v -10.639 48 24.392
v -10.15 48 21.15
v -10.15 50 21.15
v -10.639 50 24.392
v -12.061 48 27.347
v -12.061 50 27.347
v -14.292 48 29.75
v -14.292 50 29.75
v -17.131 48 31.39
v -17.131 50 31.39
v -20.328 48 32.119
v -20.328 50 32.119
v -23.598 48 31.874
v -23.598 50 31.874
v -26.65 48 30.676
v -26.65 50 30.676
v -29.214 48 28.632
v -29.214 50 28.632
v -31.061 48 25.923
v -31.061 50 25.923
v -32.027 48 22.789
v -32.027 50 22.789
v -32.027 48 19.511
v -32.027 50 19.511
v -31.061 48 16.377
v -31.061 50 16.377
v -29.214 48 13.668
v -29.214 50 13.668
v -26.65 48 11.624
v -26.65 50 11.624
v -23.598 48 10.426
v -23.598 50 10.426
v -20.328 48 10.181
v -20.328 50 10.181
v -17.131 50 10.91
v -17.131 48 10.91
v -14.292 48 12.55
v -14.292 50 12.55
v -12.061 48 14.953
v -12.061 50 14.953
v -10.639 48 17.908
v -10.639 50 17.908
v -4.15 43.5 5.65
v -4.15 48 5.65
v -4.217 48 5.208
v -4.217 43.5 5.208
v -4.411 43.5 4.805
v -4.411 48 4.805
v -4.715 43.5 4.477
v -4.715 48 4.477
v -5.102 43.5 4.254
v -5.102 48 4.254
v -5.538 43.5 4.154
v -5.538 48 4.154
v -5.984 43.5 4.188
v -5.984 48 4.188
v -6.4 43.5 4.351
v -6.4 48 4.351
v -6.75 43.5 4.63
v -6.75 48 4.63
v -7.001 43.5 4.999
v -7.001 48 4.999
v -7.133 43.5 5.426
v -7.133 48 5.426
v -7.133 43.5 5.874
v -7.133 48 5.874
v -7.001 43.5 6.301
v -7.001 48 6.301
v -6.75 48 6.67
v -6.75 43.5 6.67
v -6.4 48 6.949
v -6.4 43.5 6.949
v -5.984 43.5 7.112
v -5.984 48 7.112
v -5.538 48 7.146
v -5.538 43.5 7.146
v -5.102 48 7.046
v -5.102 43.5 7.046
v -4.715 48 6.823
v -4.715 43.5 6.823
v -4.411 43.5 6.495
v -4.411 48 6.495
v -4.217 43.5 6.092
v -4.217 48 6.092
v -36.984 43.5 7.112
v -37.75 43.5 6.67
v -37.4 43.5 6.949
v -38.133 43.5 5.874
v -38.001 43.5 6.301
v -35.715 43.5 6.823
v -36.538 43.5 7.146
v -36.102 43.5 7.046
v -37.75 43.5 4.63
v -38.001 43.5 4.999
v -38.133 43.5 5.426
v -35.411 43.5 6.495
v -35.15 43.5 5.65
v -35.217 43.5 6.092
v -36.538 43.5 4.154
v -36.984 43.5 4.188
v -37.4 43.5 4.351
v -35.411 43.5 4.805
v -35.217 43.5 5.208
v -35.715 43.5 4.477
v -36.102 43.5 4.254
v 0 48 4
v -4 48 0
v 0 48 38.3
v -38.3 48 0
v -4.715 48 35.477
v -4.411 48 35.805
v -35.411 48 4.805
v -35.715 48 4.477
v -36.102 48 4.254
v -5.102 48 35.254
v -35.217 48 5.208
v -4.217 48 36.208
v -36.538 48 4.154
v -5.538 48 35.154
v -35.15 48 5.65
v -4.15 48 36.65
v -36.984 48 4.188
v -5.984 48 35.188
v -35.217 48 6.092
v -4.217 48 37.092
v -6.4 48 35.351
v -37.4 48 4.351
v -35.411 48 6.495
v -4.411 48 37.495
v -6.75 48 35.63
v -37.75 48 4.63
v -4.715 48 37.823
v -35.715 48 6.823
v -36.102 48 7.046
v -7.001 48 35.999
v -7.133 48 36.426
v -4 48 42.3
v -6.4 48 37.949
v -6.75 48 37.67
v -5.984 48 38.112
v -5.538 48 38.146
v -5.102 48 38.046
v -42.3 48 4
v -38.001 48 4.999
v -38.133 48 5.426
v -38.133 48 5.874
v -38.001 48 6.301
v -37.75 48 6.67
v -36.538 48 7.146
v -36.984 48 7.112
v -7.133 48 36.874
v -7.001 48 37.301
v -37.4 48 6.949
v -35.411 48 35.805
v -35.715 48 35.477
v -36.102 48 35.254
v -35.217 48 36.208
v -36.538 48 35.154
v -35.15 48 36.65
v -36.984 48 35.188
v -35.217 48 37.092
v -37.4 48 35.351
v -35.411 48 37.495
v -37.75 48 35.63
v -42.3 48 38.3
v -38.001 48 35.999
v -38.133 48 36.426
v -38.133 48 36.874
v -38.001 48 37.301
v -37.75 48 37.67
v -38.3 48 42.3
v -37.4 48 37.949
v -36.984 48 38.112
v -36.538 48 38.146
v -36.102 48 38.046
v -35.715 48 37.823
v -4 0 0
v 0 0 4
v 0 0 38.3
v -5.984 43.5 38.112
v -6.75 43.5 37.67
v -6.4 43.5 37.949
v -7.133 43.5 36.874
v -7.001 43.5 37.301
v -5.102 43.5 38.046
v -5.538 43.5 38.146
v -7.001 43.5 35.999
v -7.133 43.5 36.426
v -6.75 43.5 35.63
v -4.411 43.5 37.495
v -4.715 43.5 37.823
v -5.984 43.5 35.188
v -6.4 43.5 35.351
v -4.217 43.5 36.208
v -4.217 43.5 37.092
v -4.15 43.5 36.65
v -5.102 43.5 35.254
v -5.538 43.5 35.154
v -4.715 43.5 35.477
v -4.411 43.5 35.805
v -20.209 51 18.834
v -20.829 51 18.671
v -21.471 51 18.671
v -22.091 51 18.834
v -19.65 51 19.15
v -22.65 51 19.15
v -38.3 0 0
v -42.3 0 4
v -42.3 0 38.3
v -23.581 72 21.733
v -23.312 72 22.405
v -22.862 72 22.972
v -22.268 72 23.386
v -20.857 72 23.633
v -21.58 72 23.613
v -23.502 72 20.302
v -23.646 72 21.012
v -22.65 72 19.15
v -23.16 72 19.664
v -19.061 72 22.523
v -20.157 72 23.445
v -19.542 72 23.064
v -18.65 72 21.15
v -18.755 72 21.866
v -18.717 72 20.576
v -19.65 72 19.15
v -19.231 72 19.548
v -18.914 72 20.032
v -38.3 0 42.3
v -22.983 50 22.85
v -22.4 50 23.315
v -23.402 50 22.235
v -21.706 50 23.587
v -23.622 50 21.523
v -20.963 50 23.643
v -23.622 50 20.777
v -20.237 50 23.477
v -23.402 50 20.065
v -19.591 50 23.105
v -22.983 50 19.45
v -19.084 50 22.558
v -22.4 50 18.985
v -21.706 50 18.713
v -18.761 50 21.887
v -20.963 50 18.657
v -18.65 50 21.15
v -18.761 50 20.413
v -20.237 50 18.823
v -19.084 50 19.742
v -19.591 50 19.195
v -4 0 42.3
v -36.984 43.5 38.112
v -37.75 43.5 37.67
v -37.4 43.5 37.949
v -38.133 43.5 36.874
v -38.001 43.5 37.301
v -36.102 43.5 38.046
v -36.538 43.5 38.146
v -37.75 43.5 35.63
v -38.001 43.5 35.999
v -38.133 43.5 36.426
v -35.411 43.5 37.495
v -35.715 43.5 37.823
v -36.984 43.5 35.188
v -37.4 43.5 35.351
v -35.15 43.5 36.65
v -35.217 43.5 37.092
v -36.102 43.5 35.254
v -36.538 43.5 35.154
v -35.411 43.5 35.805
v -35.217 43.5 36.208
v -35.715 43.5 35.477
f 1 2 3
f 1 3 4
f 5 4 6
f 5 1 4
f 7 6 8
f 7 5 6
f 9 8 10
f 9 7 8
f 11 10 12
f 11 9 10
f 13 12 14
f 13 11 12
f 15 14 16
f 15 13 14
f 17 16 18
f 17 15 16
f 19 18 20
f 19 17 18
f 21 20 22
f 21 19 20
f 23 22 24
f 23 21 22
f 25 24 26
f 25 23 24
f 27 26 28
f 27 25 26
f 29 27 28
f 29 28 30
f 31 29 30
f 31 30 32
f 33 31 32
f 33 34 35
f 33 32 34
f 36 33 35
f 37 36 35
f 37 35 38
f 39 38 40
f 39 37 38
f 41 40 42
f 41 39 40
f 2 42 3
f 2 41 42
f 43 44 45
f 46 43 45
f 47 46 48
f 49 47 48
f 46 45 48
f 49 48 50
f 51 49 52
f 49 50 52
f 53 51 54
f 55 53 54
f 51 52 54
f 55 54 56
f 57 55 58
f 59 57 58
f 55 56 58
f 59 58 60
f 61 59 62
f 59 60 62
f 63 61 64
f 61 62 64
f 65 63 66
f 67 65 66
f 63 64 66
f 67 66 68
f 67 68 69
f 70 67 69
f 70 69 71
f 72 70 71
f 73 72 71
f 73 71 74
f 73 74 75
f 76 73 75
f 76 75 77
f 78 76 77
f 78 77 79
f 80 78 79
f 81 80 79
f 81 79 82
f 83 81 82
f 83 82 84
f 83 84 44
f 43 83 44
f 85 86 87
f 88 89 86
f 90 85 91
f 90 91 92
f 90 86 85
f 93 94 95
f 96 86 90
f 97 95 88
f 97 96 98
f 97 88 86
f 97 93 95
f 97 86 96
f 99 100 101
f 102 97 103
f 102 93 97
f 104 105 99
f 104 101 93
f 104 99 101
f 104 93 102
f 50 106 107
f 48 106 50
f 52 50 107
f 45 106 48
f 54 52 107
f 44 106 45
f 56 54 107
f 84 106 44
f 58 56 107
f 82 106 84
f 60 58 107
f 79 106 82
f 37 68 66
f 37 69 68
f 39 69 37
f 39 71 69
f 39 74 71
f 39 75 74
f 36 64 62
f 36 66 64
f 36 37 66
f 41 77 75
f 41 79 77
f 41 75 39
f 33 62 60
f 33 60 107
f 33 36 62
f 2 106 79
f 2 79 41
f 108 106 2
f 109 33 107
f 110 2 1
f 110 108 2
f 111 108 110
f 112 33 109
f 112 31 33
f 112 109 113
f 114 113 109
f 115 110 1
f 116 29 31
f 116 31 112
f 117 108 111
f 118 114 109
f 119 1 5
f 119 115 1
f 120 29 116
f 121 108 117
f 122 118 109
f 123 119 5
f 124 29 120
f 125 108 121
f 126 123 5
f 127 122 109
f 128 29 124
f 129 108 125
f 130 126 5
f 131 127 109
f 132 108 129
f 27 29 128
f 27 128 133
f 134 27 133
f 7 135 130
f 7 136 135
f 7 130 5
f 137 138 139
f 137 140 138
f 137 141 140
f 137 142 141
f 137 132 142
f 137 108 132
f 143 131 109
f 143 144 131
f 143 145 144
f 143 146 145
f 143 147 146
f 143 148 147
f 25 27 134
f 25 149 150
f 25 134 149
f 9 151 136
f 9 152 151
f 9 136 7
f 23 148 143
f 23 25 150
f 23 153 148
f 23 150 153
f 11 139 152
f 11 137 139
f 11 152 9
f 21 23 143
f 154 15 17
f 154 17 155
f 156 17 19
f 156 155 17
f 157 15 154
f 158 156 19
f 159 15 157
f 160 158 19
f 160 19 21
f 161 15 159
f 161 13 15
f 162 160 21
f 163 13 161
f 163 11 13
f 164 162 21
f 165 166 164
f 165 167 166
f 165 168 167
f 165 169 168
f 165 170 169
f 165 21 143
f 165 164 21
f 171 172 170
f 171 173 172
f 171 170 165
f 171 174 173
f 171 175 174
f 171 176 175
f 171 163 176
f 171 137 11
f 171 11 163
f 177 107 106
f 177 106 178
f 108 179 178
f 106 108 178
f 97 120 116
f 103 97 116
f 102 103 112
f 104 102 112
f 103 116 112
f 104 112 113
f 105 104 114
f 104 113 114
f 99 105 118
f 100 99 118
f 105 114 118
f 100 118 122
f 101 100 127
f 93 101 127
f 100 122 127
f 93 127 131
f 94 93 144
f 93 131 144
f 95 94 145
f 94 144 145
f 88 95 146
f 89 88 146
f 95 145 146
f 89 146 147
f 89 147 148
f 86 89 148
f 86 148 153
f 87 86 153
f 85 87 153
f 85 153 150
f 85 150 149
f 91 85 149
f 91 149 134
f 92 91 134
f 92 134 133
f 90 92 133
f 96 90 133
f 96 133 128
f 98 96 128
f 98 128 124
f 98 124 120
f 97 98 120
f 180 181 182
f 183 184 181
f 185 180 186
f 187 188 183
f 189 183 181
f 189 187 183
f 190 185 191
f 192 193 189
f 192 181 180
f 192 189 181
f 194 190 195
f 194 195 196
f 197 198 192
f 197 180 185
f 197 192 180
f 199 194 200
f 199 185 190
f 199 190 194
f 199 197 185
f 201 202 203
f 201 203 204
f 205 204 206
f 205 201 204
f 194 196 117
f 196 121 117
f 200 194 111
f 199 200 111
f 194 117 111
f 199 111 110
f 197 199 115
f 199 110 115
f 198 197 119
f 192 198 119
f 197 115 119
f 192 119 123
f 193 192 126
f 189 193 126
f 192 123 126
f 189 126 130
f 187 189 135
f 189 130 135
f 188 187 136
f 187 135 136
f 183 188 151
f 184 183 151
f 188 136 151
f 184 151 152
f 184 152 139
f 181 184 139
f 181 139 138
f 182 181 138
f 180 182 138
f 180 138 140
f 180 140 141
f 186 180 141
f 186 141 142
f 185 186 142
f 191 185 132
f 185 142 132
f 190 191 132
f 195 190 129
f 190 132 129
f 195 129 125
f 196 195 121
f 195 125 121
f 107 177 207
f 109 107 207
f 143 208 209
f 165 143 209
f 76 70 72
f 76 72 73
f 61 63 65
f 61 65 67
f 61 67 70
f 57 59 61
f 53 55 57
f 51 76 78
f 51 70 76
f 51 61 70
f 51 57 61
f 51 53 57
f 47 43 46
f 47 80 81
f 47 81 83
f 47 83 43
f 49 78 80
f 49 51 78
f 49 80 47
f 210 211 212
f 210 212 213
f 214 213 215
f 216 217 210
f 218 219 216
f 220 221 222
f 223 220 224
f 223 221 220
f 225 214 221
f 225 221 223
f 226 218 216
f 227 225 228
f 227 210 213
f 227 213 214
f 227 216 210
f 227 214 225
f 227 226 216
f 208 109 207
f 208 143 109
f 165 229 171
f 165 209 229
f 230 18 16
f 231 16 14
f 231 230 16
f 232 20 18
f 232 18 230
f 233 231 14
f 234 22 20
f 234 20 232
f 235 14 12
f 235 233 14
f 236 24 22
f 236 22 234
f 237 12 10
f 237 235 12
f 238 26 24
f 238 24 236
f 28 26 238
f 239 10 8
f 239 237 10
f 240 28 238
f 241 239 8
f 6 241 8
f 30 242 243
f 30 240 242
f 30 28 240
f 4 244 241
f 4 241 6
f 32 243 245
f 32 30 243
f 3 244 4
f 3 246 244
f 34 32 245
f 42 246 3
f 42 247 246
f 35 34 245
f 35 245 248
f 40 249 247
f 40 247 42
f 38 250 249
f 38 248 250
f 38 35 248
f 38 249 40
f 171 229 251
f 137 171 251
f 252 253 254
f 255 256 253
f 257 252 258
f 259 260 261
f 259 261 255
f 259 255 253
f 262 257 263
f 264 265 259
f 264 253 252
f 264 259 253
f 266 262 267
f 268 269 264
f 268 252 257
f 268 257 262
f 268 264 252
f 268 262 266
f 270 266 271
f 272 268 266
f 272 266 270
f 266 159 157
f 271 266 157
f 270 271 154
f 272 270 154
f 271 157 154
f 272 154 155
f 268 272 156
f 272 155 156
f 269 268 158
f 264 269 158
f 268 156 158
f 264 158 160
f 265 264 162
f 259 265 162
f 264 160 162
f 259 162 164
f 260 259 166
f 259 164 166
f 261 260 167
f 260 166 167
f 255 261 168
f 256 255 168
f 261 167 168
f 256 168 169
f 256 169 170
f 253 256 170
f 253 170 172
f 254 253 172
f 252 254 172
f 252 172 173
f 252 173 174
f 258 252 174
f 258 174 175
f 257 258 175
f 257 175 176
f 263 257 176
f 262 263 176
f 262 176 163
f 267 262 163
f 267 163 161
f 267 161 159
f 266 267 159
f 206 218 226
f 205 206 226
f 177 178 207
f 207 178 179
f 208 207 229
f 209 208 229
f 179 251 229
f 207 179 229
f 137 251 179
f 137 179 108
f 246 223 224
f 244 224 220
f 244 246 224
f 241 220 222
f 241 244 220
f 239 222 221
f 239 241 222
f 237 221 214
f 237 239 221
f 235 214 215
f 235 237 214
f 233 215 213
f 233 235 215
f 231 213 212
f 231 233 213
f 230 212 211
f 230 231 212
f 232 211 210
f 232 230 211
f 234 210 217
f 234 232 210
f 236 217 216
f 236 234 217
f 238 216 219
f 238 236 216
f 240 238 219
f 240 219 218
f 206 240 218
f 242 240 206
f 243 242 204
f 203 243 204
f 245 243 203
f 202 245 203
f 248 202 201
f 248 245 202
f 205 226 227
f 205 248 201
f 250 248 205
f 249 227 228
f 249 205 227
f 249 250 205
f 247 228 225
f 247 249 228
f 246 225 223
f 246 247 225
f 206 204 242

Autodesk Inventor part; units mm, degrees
ref_plane "YZ Plane" through (0, 0, 0) normal (1, 0, 0) x (0, 1, 0)
ref_plane "XZ Plane" through (0, 0, 0) normal (0, 1, 0) x (-1, 0, 0)
ref_plane "XY Plane" through (0, 0, 0) normal (0, 0, 1) x (1, 0, 0)
sketch "Sketch1" plane through (0, 0, 0) normal (0, 1, 0) x (-1, 0, 0)
  line L0 (0, 0) -> (42.3, 0)
  line L1 (42.3, 0) -> (42.3, 42.3)
  line L2 (42.3, 42.3) -> (0, 42.3)
  line L3 (0, 42.3) -> (0, 0)
  dimension "d0" = 42.3
  dimension "d1" = 42.3
extrude "Extrusion1" add sketch "Sketch1" along normal blind 48
sketch "Sketch2" plane through (0, 48, 0) normal (0, 1, 0) x (1, 0, 0)
  line L0 (0, 0) -> (-42.3, 0) projected
  line L1 (0, -42.3) -> (0, 0) projected
  circle A0 centre (-21.15, -21.15) radius 11
  point P0 (0, -2)
  point P1 (-2, 0)
  point P2 (-40.3, 0)
  point P3 (0, -40.3)
  dimension "d6" = 22
  dimension "d7" = 21.15
  dimension "d8" = 21.15
extrude "Extrusion2" add sketch "Sketch2" along normal blind 2
sketch "Sketch3" plane through (-21.15, 50, 21.15) normal (0, 1, 0) x (1, 0, 0)
  circle A0 centre (0, 0) radius 11 projected
  circle A1 centre (0, 0) radius 2.5
  point P0 (21.15, 21.15)
  dimension "d11" = 5
extrude "Extrusion3" add sketch "Sketch3" along normal blind 22 contours A1
sketch "Sketch4" plane through (-21.15, 72, 21.15) normal (0, 1, 0) x (1, 0, 0)
  circle A0 centre (0, 0) radius 2.5 projected
  line L0 (-1.5, 2) -> (1.5, 2)
  point P0 (21.15, 21.15)
  dimension "d14" = 2
extrude "Extrusion4" cut sketch "Sketch4" against normal blind 21 contours L0 A0 picked at (-0.3466, 2.0912)
sketch "Sketch5" plane through (0, 48, 0) normal (0, 1, 0) x (1, 0, 0)
  line L0 (-42.3, 0) -> (-42.3, -42.3) projected
  line L1 (-42.3, -42.3) -> (0, -42.3) projected
  circle A0 centre (-36.65, -5.65) radius 1.5
  circle A1 centre (-5.65, -5.65) radius 1.5
  circle A2 centre (-5.65, -36.65) radius 1.5
  circle A3 centre (-36.65, -36.65) radius 1.5
  point P0 (-42.3, -2)
  point P1 (-42.3, -40.3)
  point P2 (-40.3, -42.3)
  point P3 (-2, -42.3)
  point P4 (0, 0)
  dimension "d17" = 3
  dimension "d18" = 3
  dimension "d19" = 3
  dimension "d20" = 3
  dimension "d21" = 31
  dimension "d22" = 5.65
  dimension "d23" = 31
  dimension "d24" = 5.65
extrude "Extrusion5" cut sketch "Sketch5" against normal blind 4.5
chamfer "Chamfer1" distance 4 angle 45 4 edges at (-42.3, 24, 0) (-42.3, 24, 42.3) (0, 24, 0) (0, 24, 42.3)
properties part number "StepperMotorNema17x48mm"
